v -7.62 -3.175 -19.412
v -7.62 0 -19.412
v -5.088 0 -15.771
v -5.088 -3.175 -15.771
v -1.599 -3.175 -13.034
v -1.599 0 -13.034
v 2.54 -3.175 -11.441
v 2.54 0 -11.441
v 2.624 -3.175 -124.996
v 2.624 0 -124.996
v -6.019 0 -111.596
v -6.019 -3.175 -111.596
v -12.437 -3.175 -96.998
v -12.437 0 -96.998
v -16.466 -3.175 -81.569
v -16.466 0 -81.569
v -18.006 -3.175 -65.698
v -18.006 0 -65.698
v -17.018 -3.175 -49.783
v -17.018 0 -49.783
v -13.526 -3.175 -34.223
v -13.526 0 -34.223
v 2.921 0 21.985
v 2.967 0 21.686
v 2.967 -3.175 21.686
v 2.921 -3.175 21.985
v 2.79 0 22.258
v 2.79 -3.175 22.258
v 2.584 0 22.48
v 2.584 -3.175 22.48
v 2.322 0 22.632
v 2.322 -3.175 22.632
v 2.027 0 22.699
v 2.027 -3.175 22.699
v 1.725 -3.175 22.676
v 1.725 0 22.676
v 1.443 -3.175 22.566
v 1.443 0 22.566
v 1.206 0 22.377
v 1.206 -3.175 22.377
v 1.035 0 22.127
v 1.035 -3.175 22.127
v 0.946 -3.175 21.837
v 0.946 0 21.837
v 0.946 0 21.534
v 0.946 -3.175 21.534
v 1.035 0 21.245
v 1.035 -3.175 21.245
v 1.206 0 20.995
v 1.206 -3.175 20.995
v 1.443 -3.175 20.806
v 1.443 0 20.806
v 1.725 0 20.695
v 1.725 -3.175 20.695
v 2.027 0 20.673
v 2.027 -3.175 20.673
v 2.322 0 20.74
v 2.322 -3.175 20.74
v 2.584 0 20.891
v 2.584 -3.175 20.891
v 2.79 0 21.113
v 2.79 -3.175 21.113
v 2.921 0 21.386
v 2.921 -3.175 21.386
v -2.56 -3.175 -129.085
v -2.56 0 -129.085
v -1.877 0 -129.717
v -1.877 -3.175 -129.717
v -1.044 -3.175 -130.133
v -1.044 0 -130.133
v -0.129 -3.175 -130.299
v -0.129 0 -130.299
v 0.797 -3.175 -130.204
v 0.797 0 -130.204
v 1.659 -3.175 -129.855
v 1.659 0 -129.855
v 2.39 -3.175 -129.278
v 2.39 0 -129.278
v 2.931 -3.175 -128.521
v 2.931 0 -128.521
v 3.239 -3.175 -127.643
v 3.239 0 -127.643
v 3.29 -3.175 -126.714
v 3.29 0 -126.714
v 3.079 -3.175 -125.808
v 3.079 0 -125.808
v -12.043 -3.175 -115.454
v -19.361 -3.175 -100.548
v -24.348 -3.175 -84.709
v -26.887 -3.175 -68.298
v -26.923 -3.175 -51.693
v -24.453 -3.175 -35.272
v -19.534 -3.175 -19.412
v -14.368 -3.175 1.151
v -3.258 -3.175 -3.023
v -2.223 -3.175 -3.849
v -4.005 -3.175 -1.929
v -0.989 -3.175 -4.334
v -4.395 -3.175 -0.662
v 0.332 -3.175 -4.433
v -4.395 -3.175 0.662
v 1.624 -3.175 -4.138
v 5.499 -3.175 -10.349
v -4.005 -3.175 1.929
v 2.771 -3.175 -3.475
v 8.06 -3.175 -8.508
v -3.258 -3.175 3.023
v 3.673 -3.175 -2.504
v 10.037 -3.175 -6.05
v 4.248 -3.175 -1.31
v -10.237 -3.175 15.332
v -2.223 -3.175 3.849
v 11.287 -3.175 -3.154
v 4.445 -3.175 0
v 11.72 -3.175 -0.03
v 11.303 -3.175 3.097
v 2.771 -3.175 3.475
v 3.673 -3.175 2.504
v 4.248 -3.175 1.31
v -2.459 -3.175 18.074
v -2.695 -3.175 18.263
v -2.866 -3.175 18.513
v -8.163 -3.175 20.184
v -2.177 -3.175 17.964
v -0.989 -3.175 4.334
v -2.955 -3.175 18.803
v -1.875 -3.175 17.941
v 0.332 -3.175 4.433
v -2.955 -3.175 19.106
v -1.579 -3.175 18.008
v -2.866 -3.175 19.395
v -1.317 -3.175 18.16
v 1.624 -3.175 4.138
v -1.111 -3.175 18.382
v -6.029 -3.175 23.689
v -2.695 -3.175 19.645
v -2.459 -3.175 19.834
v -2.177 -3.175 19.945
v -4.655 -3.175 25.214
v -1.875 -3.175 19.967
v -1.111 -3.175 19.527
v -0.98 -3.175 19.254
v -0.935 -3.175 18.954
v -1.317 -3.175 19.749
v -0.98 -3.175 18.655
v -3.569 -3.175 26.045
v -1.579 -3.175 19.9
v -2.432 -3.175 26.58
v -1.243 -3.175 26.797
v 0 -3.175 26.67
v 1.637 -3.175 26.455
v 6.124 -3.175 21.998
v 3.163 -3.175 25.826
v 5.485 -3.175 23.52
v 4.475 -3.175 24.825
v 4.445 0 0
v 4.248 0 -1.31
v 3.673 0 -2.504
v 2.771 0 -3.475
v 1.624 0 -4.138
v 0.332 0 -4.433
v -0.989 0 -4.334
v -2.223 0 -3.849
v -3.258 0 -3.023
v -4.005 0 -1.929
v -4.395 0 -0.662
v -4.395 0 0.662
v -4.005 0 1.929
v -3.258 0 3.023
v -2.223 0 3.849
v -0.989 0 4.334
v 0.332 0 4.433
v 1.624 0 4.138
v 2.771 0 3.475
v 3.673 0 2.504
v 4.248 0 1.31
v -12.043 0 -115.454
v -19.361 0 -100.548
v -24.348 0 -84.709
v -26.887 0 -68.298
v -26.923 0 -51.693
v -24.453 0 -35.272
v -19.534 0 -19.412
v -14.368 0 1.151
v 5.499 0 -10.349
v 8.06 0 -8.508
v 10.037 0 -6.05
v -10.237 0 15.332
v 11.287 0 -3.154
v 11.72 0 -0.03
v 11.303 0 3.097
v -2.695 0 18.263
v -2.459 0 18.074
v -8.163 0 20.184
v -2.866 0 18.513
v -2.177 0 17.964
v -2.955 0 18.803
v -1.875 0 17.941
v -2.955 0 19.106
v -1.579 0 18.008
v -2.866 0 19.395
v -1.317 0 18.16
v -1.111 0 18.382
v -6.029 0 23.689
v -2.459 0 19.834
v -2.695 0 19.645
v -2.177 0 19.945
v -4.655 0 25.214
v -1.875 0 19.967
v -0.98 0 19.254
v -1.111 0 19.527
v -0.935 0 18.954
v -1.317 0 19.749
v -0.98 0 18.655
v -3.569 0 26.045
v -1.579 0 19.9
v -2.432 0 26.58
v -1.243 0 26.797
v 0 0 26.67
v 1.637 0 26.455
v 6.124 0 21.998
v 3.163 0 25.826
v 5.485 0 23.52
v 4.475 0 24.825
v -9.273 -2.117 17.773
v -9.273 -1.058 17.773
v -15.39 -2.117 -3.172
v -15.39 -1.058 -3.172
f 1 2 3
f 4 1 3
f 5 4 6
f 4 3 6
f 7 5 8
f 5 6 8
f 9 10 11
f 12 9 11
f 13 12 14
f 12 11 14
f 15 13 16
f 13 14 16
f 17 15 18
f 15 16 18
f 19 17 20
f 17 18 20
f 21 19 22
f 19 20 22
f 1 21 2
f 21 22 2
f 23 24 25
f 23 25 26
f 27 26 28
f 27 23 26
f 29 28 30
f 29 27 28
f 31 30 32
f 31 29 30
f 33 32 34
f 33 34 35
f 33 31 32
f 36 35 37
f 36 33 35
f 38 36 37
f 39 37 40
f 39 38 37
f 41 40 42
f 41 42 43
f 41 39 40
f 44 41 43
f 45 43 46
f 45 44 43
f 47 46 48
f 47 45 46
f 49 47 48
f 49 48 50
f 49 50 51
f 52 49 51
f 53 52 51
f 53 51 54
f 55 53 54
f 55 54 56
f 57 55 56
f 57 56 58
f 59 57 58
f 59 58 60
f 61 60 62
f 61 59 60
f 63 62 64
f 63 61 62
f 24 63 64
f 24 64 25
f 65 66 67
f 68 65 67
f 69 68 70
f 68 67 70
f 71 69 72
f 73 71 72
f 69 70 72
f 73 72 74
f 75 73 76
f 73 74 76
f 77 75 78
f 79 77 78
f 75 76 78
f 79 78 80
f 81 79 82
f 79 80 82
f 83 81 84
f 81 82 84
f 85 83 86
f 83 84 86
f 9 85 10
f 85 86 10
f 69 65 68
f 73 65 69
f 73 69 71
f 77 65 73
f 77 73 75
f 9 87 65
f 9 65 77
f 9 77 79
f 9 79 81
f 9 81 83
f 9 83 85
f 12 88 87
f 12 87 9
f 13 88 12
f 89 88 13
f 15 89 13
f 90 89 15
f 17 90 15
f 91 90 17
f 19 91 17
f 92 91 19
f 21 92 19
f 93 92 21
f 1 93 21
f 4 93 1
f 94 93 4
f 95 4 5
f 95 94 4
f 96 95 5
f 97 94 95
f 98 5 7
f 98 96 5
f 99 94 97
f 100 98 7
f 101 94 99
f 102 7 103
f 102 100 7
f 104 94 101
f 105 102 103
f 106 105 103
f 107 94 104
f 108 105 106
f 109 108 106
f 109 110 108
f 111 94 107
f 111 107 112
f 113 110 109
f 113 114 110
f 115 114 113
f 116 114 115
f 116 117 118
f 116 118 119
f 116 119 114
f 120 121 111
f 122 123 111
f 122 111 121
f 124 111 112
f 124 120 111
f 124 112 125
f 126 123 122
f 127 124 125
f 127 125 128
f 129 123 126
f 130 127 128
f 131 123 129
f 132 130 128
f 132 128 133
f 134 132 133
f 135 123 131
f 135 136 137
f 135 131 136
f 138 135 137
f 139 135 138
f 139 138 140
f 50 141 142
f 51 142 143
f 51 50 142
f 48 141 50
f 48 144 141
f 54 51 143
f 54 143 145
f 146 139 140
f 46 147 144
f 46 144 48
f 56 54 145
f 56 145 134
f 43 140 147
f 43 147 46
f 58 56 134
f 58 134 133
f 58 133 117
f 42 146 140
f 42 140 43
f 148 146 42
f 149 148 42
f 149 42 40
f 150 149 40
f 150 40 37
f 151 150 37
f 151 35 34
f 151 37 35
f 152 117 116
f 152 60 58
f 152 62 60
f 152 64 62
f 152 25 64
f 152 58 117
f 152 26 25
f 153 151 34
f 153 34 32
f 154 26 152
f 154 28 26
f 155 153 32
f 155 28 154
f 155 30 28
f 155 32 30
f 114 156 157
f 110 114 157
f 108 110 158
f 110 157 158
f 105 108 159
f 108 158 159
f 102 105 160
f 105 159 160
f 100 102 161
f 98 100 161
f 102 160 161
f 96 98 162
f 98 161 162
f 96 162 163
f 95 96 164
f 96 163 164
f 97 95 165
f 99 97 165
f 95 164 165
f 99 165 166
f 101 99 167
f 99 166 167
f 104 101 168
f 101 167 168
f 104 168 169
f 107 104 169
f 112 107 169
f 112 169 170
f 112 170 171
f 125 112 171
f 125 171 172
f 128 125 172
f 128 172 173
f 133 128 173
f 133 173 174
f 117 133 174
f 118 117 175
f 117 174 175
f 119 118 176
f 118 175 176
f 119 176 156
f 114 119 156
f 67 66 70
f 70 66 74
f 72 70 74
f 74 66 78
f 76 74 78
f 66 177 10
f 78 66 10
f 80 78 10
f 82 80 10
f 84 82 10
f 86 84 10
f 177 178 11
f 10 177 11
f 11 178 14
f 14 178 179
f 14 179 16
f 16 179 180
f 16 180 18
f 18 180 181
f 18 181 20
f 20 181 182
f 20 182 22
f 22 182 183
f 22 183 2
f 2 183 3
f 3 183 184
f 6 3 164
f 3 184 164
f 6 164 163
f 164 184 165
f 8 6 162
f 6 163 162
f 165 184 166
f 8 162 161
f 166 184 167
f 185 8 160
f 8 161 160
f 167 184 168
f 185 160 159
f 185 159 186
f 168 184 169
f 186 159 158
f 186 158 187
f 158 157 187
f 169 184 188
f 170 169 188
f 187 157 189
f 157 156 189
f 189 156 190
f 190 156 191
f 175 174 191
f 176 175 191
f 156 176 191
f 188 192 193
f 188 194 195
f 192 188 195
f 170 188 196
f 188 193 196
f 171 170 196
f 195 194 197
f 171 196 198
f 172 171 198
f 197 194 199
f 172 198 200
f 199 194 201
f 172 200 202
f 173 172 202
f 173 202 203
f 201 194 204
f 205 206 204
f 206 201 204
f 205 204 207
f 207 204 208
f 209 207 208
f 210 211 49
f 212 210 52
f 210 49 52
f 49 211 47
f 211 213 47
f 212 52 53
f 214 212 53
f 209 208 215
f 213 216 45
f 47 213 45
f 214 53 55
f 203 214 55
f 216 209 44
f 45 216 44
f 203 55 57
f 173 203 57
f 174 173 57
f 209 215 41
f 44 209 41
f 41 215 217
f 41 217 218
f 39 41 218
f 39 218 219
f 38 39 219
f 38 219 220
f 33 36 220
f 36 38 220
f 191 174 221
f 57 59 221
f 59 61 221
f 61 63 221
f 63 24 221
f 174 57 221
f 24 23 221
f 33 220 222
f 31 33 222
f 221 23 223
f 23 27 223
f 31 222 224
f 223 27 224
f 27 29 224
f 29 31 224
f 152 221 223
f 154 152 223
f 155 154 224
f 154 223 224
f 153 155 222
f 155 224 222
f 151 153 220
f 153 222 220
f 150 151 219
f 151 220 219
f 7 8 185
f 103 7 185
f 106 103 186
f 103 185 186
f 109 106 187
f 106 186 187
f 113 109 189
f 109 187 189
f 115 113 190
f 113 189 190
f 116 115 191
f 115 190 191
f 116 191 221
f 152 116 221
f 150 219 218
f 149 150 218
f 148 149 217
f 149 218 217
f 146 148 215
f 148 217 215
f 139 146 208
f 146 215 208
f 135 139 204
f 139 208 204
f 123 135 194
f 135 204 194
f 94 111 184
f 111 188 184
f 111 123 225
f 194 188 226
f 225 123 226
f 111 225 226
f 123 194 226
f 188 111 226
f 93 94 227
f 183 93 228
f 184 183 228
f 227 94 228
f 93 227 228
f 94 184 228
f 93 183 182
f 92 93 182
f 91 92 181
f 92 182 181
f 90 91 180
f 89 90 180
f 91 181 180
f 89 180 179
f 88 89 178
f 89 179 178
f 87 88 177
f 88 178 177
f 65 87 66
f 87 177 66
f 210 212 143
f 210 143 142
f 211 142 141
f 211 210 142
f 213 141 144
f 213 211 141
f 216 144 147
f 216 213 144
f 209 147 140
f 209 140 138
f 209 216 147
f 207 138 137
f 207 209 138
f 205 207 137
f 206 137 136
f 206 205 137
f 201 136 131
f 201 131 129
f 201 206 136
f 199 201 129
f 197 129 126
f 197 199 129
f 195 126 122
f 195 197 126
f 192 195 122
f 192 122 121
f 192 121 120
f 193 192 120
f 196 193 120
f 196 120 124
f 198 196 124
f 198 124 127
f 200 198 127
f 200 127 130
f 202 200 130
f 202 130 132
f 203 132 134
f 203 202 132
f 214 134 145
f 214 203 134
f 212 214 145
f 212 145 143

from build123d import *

# Parameters (mm, degrees)
F0_R     = 1.016
F1_DEPTH = 3.175


with BuildPart() as f1:
    # F0 (on Front) → F1 (new body)
    with BuildSketch(Plane.XZ):
        with BuildLine():
            Line((11.303, 3.096916), (6.124282, 21.997996))
            ThreePointArc((6.124282, 21.997996), (3.851443, 25.368652), (0, 26.67))
            add(Edge.make_bspline(
                [(0, 26.67), (-11.245353, 29.382879), (-15.981519, -11.110423), (-19.534193, -19.411723)],
                knots=[0, 0, 0, 0, 50.051073, 50.051073, 50.051073, 50.051073], degree=3))
            Line((-19.534193, -19.411723), (-7.62, -19.411723))
            ThreePointArc((-7.62, -19.411723), (-3.445364, -14.272335), (2.54, -11.441027))
            ThreePointArc((2.54, -11.441027), (10.037186, -6.05009), (11.303, 3.096916))
        make_face()
        with BuildLine():
            ThreePointArc((-4.445, 0), (0, 4.445), (4.445, 0))
            ThreePointArc((4.445, 0), (0, -4.445), (-4.445, 0))
        make_face(mode=Mode.SUBTRACT)
        with Locations((-1.950606, 18.954171)):
            Circle(F0_R, mode=Mode.SUBTRACT)
        with Locations((1.950606, 21.685829)):
            Circle(F0_R, mode=Mode.SUBTRACT)
        with BuildLine():
            Line((-7.62, -19.411723), (-19.534193, -19.411723))
            ThreePointArc((-19.534193, -19.411723), (-25.928156, -76.551612), (-2.560215, -129.085307))
            ThreePointArc((-2.560215, -129.085307), (2.045016, -129.592511), (2.624174, -124.995776))
            ThreePointArc((2.624174, -124.995776), (-17.550677, -73.664227), (-7.62, -19.411723))
        make_face()
    extrude(amount=F1_DEPTH)


solid = f1.part
